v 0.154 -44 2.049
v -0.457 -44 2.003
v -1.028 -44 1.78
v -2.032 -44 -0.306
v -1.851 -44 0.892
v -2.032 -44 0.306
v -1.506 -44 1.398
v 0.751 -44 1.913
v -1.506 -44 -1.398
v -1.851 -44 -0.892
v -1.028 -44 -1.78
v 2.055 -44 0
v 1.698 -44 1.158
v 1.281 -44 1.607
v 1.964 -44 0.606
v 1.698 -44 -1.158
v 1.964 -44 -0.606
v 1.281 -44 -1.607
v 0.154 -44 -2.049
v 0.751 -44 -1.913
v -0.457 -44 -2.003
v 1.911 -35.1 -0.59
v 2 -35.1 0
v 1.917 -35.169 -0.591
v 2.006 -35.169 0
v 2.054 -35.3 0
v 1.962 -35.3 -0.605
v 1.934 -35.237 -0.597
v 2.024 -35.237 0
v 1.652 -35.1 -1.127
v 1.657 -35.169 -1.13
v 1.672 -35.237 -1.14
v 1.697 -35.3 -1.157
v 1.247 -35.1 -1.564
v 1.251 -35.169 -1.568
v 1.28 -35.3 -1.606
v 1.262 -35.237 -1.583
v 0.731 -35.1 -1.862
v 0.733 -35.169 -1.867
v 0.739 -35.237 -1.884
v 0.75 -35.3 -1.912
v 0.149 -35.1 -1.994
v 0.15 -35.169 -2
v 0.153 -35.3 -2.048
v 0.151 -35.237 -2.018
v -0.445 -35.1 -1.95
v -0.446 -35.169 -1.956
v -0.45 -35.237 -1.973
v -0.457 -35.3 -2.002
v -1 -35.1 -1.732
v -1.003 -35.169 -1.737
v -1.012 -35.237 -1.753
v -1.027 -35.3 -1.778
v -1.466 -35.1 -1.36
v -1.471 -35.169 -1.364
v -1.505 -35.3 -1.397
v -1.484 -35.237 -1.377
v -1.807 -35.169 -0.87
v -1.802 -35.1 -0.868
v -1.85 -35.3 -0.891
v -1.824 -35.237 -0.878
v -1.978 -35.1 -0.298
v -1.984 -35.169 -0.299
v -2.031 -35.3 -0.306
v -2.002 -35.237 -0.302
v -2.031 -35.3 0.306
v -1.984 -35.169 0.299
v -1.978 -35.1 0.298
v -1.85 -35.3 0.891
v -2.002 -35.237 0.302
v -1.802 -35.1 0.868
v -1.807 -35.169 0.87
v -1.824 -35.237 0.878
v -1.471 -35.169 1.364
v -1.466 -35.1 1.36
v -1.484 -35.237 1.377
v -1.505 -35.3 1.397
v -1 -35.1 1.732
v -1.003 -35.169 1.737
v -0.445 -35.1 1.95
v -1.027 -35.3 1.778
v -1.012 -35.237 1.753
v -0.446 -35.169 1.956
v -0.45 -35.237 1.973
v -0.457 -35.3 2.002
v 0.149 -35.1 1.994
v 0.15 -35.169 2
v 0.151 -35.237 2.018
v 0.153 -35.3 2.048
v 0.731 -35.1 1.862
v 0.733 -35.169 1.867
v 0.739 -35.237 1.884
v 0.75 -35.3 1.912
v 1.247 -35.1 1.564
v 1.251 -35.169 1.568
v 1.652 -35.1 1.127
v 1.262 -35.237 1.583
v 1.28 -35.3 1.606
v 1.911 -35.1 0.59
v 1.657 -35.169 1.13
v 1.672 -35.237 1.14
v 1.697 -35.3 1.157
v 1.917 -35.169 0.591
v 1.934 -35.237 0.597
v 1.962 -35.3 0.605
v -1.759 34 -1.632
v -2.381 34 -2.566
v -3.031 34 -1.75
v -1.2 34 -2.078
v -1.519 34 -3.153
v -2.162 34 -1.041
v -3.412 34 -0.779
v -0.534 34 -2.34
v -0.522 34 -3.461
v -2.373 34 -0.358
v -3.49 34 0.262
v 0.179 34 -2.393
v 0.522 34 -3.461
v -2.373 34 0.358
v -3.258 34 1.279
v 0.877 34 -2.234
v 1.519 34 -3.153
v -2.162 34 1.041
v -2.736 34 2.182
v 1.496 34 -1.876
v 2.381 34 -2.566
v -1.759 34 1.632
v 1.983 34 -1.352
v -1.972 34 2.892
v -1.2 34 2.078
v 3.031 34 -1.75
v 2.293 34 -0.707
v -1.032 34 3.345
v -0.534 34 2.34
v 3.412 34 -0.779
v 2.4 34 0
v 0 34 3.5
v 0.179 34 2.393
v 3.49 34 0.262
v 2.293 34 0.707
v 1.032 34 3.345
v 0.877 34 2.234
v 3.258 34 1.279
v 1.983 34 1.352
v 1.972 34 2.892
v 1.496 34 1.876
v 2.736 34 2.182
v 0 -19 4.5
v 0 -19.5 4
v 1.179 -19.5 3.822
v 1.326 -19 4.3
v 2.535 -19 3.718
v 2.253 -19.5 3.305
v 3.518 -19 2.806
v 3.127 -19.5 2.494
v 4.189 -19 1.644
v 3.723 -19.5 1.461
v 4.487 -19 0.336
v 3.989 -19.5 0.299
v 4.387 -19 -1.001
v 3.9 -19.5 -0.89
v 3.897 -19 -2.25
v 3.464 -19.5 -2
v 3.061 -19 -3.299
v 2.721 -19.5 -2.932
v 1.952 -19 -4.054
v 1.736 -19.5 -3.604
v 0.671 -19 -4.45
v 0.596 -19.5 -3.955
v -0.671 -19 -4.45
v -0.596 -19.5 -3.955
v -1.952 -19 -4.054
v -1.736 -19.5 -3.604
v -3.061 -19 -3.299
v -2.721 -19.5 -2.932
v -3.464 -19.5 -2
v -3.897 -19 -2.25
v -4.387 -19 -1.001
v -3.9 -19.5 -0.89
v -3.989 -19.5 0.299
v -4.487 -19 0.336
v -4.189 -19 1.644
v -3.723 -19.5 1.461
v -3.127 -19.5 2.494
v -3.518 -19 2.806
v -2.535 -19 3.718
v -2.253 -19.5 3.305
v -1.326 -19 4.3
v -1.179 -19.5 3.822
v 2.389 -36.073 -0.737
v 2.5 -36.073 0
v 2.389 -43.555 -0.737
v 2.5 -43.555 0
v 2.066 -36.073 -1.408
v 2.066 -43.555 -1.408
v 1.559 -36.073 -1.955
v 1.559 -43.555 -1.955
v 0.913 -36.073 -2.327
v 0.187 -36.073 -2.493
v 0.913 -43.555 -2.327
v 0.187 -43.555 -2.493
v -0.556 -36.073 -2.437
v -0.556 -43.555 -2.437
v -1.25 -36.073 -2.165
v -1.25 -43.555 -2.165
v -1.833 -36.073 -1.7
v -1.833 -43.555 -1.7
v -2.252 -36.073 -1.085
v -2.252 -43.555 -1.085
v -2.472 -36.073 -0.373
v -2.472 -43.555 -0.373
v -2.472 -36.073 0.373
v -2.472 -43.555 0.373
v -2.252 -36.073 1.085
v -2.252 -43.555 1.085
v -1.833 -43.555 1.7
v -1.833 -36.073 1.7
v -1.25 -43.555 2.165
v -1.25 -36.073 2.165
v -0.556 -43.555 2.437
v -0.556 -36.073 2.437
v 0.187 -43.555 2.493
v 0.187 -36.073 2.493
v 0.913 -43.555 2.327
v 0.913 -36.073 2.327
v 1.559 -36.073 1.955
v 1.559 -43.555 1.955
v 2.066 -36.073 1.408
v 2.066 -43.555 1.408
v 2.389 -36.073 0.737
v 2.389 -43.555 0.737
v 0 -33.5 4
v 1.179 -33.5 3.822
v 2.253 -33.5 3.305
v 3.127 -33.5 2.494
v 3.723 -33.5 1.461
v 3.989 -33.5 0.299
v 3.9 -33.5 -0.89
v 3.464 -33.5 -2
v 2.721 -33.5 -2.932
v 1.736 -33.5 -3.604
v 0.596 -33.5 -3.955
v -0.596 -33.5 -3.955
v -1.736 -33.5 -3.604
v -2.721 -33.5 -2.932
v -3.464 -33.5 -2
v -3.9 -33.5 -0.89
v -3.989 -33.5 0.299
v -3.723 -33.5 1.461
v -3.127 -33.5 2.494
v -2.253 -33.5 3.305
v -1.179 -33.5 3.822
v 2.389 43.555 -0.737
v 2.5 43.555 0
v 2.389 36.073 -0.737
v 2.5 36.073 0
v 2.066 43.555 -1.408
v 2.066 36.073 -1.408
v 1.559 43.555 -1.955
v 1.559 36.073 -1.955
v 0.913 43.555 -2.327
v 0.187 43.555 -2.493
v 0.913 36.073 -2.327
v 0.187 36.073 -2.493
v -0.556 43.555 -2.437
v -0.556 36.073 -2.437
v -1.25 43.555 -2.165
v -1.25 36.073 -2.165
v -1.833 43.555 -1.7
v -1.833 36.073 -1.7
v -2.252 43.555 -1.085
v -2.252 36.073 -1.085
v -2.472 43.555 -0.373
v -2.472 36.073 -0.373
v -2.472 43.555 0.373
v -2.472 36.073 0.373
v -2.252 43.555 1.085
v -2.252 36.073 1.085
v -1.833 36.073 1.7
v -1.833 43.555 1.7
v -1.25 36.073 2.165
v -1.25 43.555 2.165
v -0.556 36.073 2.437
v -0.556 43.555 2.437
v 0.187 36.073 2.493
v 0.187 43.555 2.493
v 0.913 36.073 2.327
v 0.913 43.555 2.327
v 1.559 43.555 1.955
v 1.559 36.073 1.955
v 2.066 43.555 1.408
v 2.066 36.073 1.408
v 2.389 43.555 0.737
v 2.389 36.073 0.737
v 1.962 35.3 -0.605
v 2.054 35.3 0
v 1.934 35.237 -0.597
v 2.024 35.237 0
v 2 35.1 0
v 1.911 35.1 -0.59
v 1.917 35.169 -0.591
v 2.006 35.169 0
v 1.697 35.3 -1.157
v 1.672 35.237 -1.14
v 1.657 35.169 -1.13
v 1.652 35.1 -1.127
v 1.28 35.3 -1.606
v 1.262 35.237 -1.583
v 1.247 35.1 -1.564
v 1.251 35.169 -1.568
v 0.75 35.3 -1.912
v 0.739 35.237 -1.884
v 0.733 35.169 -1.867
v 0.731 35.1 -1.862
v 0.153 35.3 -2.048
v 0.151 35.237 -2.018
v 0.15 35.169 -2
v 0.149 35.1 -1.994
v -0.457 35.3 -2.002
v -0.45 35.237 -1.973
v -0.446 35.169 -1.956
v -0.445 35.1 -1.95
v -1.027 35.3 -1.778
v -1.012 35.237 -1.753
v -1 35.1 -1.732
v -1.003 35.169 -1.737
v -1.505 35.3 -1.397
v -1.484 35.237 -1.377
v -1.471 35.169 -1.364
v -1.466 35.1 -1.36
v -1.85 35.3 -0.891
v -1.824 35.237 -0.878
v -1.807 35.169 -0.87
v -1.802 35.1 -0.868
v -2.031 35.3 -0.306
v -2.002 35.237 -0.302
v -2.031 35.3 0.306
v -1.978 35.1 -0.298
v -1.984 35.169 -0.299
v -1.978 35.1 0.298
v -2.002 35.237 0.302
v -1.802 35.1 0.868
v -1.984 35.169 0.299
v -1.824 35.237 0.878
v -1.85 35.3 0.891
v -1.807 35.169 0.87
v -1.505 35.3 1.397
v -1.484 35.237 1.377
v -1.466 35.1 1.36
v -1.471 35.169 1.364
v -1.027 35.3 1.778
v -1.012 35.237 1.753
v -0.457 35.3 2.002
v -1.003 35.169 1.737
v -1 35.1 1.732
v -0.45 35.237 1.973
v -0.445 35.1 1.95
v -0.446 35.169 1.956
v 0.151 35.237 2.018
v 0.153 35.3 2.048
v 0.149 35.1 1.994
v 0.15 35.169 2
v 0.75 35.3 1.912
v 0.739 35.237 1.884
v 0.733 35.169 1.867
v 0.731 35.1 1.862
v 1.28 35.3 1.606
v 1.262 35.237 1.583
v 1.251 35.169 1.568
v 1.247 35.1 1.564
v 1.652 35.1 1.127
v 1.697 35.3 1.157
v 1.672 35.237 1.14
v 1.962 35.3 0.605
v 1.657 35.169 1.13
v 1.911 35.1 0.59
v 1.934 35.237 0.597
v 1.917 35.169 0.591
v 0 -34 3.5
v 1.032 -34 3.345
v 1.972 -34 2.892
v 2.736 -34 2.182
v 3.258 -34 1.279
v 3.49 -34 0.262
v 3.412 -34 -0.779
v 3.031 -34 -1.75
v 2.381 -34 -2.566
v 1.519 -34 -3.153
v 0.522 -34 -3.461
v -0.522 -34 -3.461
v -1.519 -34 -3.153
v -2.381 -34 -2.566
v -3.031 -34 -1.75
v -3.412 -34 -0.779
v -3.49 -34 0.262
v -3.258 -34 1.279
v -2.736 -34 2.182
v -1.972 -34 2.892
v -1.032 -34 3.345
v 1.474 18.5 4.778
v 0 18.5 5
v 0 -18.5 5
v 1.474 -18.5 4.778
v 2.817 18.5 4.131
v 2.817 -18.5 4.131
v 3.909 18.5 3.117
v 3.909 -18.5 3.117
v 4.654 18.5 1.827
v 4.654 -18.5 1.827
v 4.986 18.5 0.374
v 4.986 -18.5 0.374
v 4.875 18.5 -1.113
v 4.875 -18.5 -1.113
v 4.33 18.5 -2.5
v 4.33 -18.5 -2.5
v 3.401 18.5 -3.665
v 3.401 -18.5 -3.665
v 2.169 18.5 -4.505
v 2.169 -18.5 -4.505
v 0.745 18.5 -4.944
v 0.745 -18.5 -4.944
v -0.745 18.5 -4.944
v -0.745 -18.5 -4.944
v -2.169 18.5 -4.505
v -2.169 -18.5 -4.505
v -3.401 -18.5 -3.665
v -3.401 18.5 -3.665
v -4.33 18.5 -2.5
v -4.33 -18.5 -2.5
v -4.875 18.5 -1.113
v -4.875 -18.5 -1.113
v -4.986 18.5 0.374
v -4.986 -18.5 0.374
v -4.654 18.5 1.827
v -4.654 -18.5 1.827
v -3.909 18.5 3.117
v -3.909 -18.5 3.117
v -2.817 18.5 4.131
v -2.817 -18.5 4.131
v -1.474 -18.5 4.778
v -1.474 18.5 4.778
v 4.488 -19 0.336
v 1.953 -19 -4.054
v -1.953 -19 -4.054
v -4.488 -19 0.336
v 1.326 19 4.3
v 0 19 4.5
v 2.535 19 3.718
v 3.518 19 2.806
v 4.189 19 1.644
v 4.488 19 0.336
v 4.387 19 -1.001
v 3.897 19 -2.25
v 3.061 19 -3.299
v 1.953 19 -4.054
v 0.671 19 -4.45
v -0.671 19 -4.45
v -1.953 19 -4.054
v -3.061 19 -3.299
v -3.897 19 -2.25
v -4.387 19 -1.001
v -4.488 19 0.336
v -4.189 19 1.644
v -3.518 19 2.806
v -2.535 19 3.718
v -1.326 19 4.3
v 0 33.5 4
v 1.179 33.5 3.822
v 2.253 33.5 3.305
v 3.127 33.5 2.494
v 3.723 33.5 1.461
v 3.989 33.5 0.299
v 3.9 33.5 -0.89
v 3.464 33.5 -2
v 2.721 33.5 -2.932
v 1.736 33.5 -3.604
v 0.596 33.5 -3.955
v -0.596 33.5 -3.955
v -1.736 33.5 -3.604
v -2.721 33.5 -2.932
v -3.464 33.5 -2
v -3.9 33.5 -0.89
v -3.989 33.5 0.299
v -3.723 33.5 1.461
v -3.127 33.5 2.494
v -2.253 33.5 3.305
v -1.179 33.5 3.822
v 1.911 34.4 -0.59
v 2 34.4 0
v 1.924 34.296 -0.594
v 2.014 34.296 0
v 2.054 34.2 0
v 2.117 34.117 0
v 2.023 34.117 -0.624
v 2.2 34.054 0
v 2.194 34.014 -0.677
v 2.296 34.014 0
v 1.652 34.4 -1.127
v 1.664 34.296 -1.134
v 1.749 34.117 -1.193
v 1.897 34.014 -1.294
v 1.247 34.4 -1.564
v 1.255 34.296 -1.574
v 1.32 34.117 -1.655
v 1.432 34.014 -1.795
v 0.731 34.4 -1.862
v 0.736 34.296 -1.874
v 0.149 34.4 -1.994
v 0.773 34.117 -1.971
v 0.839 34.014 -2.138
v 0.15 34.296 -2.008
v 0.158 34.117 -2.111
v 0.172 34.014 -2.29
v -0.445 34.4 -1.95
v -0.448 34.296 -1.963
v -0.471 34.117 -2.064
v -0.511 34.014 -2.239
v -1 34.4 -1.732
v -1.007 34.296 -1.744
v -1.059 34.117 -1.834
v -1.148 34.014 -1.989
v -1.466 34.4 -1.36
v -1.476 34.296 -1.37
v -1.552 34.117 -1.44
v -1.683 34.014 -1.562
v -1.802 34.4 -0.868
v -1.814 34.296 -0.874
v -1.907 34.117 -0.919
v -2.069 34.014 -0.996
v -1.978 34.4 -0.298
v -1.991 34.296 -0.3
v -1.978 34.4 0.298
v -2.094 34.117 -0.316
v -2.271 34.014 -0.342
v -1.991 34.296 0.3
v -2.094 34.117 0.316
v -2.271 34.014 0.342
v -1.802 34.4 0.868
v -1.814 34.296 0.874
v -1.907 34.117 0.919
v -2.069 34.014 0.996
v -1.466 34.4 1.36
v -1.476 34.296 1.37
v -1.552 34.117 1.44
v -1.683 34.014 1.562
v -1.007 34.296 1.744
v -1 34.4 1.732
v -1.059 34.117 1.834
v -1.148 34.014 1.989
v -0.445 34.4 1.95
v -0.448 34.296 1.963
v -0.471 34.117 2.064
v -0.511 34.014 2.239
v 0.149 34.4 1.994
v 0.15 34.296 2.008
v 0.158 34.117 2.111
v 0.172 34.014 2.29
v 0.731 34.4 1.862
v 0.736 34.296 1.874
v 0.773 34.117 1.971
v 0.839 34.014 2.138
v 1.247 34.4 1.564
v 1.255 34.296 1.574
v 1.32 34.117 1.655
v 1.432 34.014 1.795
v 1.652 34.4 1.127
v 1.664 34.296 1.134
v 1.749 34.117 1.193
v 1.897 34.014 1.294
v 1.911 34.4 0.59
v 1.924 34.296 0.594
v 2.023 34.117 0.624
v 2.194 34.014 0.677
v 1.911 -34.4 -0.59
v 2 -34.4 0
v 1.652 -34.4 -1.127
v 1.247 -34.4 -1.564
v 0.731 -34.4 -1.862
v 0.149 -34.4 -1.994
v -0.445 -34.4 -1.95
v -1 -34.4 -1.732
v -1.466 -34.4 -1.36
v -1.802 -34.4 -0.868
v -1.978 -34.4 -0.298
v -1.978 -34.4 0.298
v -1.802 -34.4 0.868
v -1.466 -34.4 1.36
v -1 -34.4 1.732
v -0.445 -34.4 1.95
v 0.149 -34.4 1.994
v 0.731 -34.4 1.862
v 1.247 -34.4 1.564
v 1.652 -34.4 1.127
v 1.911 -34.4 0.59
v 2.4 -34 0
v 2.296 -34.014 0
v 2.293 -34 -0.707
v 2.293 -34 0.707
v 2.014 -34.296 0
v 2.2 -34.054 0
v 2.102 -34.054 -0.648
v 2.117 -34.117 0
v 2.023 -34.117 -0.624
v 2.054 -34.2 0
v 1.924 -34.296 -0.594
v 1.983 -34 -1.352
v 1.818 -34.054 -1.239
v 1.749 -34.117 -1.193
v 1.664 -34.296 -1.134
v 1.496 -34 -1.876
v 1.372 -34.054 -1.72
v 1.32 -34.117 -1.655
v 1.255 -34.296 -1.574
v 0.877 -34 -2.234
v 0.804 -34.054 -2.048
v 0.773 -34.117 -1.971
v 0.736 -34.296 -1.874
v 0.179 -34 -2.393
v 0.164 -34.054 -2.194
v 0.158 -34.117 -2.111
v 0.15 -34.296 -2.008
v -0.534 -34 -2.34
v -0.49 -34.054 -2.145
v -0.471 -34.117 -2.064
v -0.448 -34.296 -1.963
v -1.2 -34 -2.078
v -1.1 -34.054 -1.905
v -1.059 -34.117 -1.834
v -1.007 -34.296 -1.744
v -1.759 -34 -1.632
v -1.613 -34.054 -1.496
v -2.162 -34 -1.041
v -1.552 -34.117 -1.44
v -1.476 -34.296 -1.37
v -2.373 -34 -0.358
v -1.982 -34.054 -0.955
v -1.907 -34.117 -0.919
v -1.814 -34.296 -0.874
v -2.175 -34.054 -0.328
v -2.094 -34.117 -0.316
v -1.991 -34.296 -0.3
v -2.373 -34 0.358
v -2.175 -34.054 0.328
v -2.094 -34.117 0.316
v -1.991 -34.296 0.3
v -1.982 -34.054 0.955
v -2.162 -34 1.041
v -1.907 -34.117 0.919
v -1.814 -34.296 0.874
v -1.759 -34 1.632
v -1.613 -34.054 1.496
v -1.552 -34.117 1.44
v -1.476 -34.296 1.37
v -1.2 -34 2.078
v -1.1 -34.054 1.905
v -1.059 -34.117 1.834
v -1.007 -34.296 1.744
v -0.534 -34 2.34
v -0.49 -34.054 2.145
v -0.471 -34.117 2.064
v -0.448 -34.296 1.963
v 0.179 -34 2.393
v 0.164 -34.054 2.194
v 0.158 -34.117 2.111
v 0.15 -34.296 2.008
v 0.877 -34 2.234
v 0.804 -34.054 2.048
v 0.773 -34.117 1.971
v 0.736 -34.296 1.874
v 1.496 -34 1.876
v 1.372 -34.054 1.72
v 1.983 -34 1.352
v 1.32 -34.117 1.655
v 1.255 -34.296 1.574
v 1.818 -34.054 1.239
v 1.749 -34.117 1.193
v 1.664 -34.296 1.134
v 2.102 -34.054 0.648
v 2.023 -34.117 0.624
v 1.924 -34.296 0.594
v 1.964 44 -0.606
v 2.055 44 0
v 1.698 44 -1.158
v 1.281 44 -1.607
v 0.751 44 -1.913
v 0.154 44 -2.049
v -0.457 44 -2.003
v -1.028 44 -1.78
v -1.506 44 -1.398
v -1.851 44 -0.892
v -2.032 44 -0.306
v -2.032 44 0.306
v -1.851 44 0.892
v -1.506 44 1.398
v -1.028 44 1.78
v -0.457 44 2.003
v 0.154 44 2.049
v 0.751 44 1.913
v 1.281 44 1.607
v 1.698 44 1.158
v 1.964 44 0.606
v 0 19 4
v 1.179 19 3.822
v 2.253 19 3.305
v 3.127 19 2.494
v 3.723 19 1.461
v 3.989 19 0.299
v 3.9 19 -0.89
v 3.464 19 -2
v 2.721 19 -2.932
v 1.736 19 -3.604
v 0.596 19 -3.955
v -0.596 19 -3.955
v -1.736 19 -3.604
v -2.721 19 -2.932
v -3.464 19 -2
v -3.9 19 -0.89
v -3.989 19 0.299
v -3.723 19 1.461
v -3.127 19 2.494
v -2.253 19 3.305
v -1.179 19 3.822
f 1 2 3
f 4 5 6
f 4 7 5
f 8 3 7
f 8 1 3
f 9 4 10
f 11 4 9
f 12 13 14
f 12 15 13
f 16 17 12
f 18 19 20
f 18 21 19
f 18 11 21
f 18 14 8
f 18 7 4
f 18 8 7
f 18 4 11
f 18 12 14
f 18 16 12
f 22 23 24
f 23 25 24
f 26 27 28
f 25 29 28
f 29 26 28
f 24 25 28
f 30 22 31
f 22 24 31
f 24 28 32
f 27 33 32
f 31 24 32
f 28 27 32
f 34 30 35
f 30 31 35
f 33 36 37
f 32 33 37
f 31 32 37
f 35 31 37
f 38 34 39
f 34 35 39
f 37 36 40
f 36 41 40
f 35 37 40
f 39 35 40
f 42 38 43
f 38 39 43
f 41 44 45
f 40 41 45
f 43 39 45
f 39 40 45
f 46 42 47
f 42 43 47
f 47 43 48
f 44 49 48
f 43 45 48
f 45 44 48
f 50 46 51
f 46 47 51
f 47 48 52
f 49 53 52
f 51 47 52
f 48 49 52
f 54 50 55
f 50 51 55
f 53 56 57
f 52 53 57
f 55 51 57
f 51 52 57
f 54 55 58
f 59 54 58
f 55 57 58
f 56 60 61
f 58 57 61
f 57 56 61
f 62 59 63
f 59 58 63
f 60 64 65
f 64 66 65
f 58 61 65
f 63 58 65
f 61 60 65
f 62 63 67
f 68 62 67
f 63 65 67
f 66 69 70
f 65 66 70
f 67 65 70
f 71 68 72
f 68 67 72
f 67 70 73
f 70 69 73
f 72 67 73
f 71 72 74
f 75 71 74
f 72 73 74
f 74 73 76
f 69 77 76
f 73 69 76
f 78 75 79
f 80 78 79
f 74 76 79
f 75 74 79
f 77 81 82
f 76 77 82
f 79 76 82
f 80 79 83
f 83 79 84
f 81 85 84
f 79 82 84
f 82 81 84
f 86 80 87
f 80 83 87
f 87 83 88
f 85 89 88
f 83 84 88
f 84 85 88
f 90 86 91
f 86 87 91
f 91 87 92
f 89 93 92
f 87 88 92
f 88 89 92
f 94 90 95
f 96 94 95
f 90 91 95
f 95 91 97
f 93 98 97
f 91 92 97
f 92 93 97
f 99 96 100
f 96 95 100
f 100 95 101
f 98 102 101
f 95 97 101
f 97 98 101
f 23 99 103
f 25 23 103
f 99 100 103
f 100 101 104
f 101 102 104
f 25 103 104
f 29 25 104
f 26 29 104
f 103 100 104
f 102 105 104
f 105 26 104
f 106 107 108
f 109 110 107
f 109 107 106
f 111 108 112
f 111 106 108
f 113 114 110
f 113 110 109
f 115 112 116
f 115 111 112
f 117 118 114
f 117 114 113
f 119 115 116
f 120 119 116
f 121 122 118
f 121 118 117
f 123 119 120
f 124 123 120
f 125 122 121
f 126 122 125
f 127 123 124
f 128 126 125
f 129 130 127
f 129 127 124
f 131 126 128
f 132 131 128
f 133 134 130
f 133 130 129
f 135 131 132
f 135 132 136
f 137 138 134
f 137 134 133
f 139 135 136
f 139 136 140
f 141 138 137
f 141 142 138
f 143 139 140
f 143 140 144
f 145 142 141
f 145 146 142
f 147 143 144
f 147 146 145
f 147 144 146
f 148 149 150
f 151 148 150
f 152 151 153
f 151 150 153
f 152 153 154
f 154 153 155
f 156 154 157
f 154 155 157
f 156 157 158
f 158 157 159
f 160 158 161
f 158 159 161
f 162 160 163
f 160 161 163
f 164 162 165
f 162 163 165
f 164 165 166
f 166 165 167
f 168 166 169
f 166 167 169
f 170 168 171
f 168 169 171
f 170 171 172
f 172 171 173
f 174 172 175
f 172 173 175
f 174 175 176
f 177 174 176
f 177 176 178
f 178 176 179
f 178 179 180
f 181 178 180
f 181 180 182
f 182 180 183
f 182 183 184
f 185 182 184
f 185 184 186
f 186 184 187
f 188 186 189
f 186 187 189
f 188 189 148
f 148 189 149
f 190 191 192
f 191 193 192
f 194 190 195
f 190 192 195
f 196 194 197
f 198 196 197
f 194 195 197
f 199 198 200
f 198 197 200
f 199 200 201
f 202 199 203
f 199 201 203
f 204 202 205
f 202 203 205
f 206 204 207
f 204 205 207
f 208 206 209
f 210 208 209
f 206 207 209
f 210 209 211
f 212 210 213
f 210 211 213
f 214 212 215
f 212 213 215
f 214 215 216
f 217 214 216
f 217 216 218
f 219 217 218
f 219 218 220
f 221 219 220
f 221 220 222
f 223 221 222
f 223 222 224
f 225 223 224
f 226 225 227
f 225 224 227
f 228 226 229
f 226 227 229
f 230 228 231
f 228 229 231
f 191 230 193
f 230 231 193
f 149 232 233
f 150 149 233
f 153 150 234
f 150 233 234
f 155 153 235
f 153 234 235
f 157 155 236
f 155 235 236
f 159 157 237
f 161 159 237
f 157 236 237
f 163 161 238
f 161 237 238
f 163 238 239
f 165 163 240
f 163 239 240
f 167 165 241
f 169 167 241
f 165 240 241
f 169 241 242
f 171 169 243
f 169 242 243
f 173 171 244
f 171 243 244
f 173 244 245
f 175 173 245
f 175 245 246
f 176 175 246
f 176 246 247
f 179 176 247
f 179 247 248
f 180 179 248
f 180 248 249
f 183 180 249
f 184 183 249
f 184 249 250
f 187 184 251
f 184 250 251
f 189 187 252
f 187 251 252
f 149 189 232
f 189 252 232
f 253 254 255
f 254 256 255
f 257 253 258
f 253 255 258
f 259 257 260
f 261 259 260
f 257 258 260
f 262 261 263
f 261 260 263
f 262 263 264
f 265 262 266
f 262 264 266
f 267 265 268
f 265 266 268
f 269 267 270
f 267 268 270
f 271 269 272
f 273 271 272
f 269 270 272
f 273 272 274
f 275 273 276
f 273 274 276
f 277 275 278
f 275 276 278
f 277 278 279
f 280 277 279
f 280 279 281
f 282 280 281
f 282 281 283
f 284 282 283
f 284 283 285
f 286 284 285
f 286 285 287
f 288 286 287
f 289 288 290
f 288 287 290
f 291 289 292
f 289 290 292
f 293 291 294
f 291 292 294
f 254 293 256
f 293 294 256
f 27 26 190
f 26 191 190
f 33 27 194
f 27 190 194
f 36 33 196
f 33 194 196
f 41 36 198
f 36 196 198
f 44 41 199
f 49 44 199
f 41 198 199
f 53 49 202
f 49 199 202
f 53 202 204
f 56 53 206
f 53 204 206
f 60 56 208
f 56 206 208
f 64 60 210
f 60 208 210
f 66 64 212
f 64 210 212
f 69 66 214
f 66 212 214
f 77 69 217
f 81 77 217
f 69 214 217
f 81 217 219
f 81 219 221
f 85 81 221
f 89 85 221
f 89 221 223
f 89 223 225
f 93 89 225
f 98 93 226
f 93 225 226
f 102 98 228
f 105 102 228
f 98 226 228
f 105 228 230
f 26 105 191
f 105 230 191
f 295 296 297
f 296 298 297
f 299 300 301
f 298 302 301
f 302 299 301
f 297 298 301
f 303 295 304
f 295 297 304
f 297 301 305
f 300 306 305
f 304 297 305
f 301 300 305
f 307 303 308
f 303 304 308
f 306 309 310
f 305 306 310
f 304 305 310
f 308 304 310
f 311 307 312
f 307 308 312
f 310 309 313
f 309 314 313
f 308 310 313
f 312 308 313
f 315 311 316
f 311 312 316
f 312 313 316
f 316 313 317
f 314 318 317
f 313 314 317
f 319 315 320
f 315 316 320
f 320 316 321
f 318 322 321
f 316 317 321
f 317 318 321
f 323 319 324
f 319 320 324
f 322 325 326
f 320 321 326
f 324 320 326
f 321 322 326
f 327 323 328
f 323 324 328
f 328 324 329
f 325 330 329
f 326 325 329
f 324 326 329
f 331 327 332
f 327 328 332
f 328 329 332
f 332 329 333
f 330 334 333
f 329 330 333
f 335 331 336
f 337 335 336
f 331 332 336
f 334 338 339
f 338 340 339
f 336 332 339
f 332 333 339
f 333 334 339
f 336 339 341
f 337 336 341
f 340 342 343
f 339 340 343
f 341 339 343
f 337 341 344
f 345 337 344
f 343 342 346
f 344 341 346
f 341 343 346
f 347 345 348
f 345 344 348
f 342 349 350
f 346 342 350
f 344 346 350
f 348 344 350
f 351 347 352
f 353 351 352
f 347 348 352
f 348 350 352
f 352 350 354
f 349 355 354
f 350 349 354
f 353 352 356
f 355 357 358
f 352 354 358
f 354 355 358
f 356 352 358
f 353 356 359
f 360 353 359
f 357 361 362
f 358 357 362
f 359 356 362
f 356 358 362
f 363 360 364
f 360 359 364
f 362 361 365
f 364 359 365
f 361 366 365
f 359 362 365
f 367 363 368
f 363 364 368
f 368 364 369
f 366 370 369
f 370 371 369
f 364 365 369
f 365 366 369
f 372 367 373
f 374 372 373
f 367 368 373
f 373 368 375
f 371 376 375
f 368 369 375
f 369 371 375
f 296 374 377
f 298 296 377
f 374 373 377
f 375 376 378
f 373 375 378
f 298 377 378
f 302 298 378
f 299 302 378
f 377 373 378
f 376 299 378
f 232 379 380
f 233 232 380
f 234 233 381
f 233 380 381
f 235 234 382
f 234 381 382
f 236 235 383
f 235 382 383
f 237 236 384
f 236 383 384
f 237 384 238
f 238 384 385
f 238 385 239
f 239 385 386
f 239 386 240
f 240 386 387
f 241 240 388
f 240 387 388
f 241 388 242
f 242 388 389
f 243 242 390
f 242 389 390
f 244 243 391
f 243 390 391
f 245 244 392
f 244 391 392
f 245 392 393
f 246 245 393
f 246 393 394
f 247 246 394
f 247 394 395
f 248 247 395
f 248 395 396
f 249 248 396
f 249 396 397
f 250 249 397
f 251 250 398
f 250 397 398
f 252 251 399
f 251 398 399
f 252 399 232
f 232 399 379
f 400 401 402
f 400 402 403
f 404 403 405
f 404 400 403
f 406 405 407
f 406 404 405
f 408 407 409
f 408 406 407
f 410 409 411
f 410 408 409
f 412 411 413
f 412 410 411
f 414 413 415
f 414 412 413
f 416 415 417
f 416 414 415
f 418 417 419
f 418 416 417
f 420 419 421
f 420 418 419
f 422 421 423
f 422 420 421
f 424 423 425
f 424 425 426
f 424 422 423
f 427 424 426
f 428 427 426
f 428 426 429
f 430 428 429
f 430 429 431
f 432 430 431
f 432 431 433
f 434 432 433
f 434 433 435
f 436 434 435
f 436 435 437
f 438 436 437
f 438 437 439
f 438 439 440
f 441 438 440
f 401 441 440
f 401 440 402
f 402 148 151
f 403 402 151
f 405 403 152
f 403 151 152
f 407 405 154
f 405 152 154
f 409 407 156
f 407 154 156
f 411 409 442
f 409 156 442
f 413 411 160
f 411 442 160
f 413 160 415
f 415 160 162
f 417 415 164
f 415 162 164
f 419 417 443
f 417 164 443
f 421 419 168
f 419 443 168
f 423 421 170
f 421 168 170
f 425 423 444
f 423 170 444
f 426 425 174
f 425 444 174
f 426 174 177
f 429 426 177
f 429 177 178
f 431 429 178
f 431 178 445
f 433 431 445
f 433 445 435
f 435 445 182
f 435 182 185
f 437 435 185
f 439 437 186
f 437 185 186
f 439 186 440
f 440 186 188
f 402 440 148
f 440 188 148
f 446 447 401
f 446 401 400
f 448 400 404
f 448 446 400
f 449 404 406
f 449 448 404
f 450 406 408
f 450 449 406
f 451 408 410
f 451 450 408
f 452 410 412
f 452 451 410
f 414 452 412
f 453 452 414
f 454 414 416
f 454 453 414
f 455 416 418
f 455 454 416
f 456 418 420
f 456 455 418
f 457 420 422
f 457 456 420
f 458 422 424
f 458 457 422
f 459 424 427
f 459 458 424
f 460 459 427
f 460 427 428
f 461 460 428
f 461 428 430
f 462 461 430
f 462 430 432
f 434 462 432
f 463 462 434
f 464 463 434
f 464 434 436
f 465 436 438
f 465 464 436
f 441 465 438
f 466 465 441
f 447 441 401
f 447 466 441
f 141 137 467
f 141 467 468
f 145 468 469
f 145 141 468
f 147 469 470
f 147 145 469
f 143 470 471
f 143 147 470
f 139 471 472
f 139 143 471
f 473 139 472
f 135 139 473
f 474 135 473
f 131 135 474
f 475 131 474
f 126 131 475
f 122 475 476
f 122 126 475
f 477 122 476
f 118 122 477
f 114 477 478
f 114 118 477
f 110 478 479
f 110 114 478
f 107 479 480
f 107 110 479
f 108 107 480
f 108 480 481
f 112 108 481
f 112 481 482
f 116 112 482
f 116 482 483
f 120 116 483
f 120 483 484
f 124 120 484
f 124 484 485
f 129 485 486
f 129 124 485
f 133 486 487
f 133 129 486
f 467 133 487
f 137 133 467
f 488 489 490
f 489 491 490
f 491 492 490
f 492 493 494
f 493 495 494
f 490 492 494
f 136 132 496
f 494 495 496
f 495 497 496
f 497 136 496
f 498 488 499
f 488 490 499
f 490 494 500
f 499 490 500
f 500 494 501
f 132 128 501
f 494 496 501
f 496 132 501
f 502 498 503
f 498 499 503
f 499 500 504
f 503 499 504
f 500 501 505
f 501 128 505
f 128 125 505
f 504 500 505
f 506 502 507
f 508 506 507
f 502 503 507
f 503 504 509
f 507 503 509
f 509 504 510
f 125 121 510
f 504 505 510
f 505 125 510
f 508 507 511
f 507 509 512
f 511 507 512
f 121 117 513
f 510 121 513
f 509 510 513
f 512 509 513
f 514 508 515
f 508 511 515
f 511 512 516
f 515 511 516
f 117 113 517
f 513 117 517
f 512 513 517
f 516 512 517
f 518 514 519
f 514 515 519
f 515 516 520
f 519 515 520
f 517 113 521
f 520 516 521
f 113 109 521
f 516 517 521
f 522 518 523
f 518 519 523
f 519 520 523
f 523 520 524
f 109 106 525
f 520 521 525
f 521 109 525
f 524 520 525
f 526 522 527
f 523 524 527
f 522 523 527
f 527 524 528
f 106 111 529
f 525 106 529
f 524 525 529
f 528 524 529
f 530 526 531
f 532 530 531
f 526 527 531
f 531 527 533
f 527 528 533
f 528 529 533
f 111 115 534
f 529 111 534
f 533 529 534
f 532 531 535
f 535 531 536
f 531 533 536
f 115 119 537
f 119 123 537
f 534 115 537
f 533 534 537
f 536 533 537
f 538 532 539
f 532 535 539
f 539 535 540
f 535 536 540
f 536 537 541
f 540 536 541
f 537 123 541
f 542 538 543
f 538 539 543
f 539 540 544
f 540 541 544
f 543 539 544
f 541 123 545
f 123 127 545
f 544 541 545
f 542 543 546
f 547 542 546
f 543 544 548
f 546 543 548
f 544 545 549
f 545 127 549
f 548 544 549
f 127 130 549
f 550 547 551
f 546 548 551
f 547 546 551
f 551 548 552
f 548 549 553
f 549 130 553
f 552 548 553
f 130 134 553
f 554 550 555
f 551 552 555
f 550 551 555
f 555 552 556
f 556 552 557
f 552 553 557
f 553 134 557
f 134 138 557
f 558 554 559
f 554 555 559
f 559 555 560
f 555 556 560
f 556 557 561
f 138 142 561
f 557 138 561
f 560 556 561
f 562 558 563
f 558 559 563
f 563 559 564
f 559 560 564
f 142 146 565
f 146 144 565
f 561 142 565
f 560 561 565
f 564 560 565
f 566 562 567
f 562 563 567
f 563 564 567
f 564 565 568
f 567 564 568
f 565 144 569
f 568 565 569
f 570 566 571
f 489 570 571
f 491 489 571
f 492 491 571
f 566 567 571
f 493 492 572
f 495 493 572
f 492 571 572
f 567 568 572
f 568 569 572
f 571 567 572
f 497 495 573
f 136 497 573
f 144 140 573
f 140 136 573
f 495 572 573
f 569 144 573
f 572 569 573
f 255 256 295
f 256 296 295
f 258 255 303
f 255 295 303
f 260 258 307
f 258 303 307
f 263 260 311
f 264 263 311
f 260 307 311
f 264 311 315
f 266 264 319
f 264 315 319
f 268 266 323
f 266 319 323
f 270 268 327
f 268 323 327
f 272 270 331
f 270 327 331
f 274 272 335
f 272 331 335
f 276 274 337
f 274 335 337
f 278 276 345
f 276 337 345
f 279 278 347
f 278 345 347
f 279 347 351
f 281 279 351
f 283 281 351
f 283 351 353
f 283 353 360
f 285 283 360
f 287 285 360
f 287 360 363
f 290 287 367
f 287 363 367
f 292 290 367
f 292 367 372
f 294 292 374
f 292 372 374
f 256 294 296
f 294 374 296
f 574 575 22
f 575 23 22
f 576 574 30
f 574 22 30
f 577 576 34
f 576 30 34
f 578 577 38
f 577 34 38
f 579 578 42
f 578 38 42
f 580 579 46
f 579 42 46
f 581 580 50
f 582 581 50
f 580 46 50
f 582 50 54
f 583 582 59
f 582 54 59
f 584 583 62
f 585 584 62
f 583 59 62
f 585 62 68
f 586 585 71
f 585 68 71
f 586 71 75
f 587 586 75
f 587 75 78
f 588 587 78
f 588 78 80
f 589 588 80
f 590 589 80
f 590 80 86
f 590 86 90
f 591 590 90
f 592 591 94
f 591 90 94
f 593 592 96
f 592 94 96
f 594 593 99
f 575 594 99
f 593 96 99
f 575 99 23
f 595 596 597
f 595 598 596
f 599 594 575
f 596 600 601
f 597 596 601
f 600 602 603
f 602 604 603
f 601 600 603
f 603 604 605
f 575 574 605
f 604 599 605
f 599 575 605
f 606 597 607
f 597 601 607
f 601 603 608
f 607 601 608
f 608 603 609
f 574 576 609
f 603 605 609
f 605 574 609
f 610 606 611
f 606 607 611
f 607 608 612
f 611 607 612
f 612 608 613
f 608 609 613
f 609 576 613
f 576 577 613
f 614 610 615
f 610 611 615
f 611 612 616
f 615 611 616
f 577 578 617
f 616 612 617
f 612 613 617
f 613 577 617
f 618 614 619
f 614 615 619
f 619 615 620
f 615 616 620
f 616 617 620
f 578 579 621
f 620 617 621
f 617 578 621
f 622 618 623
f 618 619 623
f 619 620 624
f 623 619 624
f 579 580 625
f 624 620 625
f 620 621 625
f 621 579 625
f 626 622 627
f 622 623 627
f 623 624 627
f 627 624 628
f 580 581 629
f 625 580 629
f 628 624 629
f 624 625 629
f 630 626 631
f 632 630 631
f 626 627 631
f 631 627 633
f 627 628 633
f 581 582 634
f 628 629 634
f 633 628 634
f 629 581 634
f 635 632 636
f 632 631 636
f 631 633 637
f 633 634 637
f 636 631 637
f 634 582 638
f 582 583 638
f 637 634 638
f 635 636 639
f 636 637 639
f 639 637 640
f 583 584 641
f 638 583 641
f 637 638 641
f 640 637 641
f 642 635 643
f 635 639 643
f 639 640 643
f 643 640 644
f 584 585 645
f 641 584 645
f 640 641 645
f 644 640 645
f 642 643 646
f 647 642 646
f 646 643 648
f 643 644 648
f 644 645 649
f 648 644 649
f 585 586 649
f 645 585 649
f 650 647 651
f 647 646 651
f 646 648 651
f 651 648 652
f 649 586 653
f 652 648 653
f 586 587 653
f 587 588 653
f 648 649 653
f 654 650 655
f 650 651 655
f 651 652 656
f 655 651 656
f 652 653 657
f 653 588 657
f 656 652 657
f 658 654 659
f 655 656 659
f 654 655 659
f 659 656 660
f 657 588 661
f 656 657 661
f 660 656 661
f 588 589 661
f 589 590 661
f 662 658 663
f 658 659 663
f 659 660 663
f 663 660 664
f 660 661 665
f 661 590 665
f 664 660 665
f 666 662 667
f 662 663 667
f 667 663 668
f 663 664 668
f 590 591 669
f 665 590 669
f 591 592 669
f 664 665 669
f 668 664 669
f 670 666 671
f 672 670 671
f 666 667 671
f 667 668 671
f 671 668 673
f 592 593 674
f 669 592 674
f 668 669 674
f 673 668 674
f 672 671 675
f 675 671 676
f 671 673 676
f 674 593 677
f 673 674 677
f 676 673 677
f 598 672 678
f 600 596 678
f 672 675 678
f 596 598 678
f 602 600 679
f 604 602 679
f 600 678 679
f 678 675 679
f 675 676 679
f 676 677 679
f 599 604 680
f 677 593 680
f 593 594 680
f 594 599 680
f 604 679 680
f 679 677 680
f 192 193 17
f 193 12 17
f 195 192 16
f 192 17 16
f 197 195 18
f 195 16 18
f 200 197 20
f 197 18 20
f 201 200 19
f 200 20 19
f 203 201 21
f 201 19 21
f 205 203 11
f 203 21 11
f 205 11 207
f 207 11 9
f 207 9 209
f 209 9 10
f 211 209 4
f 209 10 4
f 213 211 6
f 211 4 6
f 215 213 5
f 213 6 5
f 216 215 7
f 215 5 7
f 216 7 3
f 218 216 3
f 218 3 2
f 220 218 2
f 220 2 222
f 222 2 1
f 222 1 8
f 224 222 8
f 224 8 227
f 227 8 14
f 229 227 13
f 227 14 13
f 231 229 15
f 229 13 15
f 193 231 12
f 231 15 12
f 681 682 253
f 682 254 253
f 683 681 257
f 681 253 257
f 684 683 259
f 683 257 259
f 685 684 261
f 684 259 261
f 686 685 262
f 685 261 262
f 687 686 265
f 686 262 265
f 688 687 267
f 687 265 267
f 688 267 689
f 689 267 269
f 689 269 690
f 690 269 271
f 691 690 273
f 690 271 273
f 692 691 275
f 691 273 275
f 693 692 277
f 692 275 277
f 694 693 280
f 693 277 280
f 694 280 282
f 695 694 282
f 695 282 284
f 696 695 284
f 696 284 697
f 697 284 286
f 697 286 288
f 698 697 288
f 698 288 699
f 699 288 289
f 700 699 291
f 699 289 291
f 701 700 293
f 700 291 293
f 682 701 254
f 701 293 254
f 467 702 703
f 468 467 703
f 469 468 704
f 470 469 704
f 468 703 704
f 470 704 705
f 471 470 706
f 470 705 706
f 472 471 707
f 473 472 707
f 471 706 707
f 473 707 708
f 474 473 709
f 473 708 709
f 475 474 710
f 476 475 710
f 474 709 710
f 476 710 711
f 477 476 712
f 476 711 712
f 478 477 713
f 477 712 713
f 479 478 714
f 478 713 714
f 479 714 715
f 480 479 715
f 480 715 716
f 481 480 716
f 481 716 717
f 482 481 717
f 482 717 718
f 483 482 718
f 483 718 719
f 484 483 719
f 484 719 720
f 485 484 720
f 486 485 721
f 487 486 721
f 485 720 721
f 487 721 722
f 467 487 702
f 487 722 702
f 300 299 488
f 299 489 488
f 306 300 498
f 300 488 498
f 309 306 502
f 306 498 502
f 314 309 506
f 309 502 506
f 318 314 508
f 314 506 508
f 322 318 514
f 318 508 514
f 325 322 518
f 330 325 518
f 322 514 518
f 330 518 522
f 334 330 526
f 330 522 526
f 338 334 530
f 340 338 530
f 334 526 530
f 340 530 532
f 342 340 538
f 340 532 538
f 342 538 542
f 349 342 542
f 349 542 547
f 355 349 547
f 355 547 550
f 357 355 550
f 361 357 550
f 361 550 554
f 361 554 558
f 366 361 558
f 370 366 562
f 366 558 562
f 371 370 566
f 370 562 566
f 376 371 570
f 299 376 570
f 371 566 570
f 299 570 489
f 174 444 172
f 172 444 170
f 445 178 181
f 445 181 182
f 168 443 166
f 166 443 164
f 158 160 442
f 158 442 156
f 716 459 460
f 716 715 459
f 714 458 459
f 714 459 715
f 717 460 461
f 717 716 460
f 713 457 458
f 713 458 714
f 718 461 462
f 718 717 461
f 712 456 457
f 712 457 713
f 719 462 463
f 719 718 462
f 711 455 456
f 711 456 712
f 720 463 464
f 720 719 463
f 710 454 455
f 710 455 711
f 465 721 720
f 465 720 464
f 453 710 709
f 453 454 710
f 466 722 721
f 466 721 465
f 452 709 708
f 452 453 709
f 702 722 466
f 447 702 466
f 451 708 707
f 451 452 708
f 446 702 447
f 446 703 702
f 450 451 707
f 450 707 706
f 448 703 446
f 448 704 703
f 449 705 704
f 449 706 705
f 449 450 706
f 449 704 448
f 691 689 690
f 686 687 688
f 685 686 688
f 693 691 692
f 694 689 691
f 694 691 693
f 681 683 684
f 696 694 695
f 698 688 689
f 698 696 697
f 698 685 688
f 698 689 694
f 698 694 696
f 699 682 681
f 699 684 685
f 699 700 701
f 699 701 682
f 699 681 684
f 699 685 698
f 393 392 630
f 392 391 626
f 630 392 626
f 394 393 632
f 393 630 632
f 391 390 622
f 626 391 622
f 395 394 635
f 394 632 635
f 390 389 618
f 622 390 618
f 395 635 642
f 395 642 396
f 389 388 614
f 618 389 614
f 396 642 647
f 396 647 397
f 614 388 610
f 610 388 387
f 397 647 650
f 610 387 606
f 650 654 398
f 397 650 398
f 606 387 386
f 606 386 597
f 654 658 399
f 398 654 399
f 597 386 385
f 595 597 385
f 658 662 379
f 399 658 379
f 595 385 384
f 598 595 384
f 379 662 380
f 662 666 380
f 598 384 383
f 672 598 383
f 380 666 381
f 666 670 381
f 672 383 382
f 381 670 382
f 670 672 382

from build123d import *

# Parameters (mm, degrees)
SKETCH1_R           = 5
BOSS_EXTRUDE1_DEPTH = 19
SKETCH2_R           = 4
BOSS_EXTRUDE2_DEPTH = 15
BOSS_EXTRUDE3_START = -53
SKETCH2_2_R         = 4
BOSS_EXTRUDE3_DEPTH = 15
CHAMFER2_SIZE       = 0.5
SKETCH5_R           = 2.6
BOSS_EXTRUDE4_DEPTH = 10
SKETCH7_R           = 2.6
BOSS_EXTRUDE5_DEPTH = 10


# Read off the part's stored shape, not the designer's step: M5 Machine Threads Stud3, M5 Machine Threads Stud4
with BuildPart() as part:
    # Sketch1 → Boss-Extrude1 (new, symmetric)
    with BuildSketch(Plane(origin=(0, 0, 0), x_dir=(1, 0, 0), z_dir=(0, 1, 0))):
        with Locations(Location((0, 0, 0), (0, 0, 270))):
            Circle(SKETCH1_R)
    extrude(amount=BOSS_EXTRUDE1_DEPTH, both=True)

    # Sketch2 → Boss-Extrude2 (add)
    with BuildSketch(Plane(origin=(0, 19, 0), x_dir=(1, 0, 0), z_dir=(0, 1, 0))):
        with Locations(Location((0, 0, 0), (0, 0, 270))):
            Circle(SKETCH2_R)
    extrude(amount=BOSS_EXTRUDE2_DEPTH)

    # Sketch2<2> → Boss-Extrude3 (add)
    with BuildSketch(Plane(origin=(0, 19, 0), x_dir=(1, 0, 0), z_dir=(0, 1, 0)).offset(BOSS_EXTRUDE3_START)):
        with Locations(Location((0, 0, 0), (0, 0, 270))):
            Circle(SKETCH2_2_R)
    extrude(amount=BOSS_EXTRUDE3_DEPTH)

    # Chamfer2
    chamfer2_edges = [part.edges().sort_by_distance(p)[0] for p in [
        (0, -34, -4),
        (0, -19, -4),
        (0, -19, -5),
        (0, 19, -5),
        (0, 34, -4),
    ]]
    chamfer(chamfer2_edges, length=CHAMFER2_SIZE - 0.0001)  # a hair under: the kernel refuses the full size

    # Sketch5 → Boss-Extrude4 (add)
    with BuildSketch(Plane.XZ.offset(34)):
        with Locations(Location((0, 0, 0), (0, 0, 270))):
            Circle(SKETCH5_R)
    extrude(amount=BOSS_EXTRUDE4_DEPTH)

    # M5 Machine Threads Stud3 outline → M5 Machine Threads Stud3 (revolve, cut)
    with BuildSketch(Plane.XY):
        with BuildLine():
            Line((2.6, -44), (2.6, -34))
            Line((2.6, -34), (2.4, -34))
            ThreePointArc((2.4, -34), (2.117157288, -34.117157288), (2, -34.4))
            Line((2, -34.4), (2, -35.1))
            ThreePointArc((2, -35.1), (2.013629669, -35.203527618), (2.053589838, -35.3))
            Line((2.053589838, -35.3), (2.5, -36.073205081))
            Line((2.5, -36.073205081), (2.5, -43.555))
            Line((2.5, -43.555), (2.055, -44))
            Line((2.055, -44), (2.6, -44))
        make_face()
    revolve(axis=Axis((0, 0, 0), (0, 1, 0)), mode=Mode.SUBTRACT)

    # Sketch7 → Boss-Extrude5 (add)
    with BuildSketch(Plane(origin=(0, 34, 0), x_dir=(1, 0, 0), z_dir=(0, 1, 0))):
        with Locations(Location((0, 0, 0), (0, 0, 270))):
            Circle(SKETCH7_R)
    extrude(amount=BOSS_EXTRUDE5_DEPTH)

    # M5 Machine Threads Stud4 outline → M5 Machine Threads Stud4 (revolve, cut)
    with BuildSketch(Plane.XY):
        with BuildLine():
            Line((2.6, 44), (2.055, 44))
            Line((2.055, 44), (2.5, 43.555))
            Line((2.5, 43.555), (2.5, 36.073205081))
            Line((2.5, 36.073205081), (2.053589838, 35.3))
            ThreePointArc((2.053589838, 35.3), (2.013629669, 35.203527618), (2, 35.1))
            Line((2, 35.1), (2, 34.4))
            ThreePointArc((2, 34.4), (2.117157288, 34.117157288), (2.4, 34))
            Line((2.4, 34), (2.6, 34))
            Line((2.6, 34), (2.6, 44))
        make_face()
    revolve(axis=Axis((0, 0, 0), (0, 1, 0)), mode=Mode.SUBTRACT)


solid = part.part
